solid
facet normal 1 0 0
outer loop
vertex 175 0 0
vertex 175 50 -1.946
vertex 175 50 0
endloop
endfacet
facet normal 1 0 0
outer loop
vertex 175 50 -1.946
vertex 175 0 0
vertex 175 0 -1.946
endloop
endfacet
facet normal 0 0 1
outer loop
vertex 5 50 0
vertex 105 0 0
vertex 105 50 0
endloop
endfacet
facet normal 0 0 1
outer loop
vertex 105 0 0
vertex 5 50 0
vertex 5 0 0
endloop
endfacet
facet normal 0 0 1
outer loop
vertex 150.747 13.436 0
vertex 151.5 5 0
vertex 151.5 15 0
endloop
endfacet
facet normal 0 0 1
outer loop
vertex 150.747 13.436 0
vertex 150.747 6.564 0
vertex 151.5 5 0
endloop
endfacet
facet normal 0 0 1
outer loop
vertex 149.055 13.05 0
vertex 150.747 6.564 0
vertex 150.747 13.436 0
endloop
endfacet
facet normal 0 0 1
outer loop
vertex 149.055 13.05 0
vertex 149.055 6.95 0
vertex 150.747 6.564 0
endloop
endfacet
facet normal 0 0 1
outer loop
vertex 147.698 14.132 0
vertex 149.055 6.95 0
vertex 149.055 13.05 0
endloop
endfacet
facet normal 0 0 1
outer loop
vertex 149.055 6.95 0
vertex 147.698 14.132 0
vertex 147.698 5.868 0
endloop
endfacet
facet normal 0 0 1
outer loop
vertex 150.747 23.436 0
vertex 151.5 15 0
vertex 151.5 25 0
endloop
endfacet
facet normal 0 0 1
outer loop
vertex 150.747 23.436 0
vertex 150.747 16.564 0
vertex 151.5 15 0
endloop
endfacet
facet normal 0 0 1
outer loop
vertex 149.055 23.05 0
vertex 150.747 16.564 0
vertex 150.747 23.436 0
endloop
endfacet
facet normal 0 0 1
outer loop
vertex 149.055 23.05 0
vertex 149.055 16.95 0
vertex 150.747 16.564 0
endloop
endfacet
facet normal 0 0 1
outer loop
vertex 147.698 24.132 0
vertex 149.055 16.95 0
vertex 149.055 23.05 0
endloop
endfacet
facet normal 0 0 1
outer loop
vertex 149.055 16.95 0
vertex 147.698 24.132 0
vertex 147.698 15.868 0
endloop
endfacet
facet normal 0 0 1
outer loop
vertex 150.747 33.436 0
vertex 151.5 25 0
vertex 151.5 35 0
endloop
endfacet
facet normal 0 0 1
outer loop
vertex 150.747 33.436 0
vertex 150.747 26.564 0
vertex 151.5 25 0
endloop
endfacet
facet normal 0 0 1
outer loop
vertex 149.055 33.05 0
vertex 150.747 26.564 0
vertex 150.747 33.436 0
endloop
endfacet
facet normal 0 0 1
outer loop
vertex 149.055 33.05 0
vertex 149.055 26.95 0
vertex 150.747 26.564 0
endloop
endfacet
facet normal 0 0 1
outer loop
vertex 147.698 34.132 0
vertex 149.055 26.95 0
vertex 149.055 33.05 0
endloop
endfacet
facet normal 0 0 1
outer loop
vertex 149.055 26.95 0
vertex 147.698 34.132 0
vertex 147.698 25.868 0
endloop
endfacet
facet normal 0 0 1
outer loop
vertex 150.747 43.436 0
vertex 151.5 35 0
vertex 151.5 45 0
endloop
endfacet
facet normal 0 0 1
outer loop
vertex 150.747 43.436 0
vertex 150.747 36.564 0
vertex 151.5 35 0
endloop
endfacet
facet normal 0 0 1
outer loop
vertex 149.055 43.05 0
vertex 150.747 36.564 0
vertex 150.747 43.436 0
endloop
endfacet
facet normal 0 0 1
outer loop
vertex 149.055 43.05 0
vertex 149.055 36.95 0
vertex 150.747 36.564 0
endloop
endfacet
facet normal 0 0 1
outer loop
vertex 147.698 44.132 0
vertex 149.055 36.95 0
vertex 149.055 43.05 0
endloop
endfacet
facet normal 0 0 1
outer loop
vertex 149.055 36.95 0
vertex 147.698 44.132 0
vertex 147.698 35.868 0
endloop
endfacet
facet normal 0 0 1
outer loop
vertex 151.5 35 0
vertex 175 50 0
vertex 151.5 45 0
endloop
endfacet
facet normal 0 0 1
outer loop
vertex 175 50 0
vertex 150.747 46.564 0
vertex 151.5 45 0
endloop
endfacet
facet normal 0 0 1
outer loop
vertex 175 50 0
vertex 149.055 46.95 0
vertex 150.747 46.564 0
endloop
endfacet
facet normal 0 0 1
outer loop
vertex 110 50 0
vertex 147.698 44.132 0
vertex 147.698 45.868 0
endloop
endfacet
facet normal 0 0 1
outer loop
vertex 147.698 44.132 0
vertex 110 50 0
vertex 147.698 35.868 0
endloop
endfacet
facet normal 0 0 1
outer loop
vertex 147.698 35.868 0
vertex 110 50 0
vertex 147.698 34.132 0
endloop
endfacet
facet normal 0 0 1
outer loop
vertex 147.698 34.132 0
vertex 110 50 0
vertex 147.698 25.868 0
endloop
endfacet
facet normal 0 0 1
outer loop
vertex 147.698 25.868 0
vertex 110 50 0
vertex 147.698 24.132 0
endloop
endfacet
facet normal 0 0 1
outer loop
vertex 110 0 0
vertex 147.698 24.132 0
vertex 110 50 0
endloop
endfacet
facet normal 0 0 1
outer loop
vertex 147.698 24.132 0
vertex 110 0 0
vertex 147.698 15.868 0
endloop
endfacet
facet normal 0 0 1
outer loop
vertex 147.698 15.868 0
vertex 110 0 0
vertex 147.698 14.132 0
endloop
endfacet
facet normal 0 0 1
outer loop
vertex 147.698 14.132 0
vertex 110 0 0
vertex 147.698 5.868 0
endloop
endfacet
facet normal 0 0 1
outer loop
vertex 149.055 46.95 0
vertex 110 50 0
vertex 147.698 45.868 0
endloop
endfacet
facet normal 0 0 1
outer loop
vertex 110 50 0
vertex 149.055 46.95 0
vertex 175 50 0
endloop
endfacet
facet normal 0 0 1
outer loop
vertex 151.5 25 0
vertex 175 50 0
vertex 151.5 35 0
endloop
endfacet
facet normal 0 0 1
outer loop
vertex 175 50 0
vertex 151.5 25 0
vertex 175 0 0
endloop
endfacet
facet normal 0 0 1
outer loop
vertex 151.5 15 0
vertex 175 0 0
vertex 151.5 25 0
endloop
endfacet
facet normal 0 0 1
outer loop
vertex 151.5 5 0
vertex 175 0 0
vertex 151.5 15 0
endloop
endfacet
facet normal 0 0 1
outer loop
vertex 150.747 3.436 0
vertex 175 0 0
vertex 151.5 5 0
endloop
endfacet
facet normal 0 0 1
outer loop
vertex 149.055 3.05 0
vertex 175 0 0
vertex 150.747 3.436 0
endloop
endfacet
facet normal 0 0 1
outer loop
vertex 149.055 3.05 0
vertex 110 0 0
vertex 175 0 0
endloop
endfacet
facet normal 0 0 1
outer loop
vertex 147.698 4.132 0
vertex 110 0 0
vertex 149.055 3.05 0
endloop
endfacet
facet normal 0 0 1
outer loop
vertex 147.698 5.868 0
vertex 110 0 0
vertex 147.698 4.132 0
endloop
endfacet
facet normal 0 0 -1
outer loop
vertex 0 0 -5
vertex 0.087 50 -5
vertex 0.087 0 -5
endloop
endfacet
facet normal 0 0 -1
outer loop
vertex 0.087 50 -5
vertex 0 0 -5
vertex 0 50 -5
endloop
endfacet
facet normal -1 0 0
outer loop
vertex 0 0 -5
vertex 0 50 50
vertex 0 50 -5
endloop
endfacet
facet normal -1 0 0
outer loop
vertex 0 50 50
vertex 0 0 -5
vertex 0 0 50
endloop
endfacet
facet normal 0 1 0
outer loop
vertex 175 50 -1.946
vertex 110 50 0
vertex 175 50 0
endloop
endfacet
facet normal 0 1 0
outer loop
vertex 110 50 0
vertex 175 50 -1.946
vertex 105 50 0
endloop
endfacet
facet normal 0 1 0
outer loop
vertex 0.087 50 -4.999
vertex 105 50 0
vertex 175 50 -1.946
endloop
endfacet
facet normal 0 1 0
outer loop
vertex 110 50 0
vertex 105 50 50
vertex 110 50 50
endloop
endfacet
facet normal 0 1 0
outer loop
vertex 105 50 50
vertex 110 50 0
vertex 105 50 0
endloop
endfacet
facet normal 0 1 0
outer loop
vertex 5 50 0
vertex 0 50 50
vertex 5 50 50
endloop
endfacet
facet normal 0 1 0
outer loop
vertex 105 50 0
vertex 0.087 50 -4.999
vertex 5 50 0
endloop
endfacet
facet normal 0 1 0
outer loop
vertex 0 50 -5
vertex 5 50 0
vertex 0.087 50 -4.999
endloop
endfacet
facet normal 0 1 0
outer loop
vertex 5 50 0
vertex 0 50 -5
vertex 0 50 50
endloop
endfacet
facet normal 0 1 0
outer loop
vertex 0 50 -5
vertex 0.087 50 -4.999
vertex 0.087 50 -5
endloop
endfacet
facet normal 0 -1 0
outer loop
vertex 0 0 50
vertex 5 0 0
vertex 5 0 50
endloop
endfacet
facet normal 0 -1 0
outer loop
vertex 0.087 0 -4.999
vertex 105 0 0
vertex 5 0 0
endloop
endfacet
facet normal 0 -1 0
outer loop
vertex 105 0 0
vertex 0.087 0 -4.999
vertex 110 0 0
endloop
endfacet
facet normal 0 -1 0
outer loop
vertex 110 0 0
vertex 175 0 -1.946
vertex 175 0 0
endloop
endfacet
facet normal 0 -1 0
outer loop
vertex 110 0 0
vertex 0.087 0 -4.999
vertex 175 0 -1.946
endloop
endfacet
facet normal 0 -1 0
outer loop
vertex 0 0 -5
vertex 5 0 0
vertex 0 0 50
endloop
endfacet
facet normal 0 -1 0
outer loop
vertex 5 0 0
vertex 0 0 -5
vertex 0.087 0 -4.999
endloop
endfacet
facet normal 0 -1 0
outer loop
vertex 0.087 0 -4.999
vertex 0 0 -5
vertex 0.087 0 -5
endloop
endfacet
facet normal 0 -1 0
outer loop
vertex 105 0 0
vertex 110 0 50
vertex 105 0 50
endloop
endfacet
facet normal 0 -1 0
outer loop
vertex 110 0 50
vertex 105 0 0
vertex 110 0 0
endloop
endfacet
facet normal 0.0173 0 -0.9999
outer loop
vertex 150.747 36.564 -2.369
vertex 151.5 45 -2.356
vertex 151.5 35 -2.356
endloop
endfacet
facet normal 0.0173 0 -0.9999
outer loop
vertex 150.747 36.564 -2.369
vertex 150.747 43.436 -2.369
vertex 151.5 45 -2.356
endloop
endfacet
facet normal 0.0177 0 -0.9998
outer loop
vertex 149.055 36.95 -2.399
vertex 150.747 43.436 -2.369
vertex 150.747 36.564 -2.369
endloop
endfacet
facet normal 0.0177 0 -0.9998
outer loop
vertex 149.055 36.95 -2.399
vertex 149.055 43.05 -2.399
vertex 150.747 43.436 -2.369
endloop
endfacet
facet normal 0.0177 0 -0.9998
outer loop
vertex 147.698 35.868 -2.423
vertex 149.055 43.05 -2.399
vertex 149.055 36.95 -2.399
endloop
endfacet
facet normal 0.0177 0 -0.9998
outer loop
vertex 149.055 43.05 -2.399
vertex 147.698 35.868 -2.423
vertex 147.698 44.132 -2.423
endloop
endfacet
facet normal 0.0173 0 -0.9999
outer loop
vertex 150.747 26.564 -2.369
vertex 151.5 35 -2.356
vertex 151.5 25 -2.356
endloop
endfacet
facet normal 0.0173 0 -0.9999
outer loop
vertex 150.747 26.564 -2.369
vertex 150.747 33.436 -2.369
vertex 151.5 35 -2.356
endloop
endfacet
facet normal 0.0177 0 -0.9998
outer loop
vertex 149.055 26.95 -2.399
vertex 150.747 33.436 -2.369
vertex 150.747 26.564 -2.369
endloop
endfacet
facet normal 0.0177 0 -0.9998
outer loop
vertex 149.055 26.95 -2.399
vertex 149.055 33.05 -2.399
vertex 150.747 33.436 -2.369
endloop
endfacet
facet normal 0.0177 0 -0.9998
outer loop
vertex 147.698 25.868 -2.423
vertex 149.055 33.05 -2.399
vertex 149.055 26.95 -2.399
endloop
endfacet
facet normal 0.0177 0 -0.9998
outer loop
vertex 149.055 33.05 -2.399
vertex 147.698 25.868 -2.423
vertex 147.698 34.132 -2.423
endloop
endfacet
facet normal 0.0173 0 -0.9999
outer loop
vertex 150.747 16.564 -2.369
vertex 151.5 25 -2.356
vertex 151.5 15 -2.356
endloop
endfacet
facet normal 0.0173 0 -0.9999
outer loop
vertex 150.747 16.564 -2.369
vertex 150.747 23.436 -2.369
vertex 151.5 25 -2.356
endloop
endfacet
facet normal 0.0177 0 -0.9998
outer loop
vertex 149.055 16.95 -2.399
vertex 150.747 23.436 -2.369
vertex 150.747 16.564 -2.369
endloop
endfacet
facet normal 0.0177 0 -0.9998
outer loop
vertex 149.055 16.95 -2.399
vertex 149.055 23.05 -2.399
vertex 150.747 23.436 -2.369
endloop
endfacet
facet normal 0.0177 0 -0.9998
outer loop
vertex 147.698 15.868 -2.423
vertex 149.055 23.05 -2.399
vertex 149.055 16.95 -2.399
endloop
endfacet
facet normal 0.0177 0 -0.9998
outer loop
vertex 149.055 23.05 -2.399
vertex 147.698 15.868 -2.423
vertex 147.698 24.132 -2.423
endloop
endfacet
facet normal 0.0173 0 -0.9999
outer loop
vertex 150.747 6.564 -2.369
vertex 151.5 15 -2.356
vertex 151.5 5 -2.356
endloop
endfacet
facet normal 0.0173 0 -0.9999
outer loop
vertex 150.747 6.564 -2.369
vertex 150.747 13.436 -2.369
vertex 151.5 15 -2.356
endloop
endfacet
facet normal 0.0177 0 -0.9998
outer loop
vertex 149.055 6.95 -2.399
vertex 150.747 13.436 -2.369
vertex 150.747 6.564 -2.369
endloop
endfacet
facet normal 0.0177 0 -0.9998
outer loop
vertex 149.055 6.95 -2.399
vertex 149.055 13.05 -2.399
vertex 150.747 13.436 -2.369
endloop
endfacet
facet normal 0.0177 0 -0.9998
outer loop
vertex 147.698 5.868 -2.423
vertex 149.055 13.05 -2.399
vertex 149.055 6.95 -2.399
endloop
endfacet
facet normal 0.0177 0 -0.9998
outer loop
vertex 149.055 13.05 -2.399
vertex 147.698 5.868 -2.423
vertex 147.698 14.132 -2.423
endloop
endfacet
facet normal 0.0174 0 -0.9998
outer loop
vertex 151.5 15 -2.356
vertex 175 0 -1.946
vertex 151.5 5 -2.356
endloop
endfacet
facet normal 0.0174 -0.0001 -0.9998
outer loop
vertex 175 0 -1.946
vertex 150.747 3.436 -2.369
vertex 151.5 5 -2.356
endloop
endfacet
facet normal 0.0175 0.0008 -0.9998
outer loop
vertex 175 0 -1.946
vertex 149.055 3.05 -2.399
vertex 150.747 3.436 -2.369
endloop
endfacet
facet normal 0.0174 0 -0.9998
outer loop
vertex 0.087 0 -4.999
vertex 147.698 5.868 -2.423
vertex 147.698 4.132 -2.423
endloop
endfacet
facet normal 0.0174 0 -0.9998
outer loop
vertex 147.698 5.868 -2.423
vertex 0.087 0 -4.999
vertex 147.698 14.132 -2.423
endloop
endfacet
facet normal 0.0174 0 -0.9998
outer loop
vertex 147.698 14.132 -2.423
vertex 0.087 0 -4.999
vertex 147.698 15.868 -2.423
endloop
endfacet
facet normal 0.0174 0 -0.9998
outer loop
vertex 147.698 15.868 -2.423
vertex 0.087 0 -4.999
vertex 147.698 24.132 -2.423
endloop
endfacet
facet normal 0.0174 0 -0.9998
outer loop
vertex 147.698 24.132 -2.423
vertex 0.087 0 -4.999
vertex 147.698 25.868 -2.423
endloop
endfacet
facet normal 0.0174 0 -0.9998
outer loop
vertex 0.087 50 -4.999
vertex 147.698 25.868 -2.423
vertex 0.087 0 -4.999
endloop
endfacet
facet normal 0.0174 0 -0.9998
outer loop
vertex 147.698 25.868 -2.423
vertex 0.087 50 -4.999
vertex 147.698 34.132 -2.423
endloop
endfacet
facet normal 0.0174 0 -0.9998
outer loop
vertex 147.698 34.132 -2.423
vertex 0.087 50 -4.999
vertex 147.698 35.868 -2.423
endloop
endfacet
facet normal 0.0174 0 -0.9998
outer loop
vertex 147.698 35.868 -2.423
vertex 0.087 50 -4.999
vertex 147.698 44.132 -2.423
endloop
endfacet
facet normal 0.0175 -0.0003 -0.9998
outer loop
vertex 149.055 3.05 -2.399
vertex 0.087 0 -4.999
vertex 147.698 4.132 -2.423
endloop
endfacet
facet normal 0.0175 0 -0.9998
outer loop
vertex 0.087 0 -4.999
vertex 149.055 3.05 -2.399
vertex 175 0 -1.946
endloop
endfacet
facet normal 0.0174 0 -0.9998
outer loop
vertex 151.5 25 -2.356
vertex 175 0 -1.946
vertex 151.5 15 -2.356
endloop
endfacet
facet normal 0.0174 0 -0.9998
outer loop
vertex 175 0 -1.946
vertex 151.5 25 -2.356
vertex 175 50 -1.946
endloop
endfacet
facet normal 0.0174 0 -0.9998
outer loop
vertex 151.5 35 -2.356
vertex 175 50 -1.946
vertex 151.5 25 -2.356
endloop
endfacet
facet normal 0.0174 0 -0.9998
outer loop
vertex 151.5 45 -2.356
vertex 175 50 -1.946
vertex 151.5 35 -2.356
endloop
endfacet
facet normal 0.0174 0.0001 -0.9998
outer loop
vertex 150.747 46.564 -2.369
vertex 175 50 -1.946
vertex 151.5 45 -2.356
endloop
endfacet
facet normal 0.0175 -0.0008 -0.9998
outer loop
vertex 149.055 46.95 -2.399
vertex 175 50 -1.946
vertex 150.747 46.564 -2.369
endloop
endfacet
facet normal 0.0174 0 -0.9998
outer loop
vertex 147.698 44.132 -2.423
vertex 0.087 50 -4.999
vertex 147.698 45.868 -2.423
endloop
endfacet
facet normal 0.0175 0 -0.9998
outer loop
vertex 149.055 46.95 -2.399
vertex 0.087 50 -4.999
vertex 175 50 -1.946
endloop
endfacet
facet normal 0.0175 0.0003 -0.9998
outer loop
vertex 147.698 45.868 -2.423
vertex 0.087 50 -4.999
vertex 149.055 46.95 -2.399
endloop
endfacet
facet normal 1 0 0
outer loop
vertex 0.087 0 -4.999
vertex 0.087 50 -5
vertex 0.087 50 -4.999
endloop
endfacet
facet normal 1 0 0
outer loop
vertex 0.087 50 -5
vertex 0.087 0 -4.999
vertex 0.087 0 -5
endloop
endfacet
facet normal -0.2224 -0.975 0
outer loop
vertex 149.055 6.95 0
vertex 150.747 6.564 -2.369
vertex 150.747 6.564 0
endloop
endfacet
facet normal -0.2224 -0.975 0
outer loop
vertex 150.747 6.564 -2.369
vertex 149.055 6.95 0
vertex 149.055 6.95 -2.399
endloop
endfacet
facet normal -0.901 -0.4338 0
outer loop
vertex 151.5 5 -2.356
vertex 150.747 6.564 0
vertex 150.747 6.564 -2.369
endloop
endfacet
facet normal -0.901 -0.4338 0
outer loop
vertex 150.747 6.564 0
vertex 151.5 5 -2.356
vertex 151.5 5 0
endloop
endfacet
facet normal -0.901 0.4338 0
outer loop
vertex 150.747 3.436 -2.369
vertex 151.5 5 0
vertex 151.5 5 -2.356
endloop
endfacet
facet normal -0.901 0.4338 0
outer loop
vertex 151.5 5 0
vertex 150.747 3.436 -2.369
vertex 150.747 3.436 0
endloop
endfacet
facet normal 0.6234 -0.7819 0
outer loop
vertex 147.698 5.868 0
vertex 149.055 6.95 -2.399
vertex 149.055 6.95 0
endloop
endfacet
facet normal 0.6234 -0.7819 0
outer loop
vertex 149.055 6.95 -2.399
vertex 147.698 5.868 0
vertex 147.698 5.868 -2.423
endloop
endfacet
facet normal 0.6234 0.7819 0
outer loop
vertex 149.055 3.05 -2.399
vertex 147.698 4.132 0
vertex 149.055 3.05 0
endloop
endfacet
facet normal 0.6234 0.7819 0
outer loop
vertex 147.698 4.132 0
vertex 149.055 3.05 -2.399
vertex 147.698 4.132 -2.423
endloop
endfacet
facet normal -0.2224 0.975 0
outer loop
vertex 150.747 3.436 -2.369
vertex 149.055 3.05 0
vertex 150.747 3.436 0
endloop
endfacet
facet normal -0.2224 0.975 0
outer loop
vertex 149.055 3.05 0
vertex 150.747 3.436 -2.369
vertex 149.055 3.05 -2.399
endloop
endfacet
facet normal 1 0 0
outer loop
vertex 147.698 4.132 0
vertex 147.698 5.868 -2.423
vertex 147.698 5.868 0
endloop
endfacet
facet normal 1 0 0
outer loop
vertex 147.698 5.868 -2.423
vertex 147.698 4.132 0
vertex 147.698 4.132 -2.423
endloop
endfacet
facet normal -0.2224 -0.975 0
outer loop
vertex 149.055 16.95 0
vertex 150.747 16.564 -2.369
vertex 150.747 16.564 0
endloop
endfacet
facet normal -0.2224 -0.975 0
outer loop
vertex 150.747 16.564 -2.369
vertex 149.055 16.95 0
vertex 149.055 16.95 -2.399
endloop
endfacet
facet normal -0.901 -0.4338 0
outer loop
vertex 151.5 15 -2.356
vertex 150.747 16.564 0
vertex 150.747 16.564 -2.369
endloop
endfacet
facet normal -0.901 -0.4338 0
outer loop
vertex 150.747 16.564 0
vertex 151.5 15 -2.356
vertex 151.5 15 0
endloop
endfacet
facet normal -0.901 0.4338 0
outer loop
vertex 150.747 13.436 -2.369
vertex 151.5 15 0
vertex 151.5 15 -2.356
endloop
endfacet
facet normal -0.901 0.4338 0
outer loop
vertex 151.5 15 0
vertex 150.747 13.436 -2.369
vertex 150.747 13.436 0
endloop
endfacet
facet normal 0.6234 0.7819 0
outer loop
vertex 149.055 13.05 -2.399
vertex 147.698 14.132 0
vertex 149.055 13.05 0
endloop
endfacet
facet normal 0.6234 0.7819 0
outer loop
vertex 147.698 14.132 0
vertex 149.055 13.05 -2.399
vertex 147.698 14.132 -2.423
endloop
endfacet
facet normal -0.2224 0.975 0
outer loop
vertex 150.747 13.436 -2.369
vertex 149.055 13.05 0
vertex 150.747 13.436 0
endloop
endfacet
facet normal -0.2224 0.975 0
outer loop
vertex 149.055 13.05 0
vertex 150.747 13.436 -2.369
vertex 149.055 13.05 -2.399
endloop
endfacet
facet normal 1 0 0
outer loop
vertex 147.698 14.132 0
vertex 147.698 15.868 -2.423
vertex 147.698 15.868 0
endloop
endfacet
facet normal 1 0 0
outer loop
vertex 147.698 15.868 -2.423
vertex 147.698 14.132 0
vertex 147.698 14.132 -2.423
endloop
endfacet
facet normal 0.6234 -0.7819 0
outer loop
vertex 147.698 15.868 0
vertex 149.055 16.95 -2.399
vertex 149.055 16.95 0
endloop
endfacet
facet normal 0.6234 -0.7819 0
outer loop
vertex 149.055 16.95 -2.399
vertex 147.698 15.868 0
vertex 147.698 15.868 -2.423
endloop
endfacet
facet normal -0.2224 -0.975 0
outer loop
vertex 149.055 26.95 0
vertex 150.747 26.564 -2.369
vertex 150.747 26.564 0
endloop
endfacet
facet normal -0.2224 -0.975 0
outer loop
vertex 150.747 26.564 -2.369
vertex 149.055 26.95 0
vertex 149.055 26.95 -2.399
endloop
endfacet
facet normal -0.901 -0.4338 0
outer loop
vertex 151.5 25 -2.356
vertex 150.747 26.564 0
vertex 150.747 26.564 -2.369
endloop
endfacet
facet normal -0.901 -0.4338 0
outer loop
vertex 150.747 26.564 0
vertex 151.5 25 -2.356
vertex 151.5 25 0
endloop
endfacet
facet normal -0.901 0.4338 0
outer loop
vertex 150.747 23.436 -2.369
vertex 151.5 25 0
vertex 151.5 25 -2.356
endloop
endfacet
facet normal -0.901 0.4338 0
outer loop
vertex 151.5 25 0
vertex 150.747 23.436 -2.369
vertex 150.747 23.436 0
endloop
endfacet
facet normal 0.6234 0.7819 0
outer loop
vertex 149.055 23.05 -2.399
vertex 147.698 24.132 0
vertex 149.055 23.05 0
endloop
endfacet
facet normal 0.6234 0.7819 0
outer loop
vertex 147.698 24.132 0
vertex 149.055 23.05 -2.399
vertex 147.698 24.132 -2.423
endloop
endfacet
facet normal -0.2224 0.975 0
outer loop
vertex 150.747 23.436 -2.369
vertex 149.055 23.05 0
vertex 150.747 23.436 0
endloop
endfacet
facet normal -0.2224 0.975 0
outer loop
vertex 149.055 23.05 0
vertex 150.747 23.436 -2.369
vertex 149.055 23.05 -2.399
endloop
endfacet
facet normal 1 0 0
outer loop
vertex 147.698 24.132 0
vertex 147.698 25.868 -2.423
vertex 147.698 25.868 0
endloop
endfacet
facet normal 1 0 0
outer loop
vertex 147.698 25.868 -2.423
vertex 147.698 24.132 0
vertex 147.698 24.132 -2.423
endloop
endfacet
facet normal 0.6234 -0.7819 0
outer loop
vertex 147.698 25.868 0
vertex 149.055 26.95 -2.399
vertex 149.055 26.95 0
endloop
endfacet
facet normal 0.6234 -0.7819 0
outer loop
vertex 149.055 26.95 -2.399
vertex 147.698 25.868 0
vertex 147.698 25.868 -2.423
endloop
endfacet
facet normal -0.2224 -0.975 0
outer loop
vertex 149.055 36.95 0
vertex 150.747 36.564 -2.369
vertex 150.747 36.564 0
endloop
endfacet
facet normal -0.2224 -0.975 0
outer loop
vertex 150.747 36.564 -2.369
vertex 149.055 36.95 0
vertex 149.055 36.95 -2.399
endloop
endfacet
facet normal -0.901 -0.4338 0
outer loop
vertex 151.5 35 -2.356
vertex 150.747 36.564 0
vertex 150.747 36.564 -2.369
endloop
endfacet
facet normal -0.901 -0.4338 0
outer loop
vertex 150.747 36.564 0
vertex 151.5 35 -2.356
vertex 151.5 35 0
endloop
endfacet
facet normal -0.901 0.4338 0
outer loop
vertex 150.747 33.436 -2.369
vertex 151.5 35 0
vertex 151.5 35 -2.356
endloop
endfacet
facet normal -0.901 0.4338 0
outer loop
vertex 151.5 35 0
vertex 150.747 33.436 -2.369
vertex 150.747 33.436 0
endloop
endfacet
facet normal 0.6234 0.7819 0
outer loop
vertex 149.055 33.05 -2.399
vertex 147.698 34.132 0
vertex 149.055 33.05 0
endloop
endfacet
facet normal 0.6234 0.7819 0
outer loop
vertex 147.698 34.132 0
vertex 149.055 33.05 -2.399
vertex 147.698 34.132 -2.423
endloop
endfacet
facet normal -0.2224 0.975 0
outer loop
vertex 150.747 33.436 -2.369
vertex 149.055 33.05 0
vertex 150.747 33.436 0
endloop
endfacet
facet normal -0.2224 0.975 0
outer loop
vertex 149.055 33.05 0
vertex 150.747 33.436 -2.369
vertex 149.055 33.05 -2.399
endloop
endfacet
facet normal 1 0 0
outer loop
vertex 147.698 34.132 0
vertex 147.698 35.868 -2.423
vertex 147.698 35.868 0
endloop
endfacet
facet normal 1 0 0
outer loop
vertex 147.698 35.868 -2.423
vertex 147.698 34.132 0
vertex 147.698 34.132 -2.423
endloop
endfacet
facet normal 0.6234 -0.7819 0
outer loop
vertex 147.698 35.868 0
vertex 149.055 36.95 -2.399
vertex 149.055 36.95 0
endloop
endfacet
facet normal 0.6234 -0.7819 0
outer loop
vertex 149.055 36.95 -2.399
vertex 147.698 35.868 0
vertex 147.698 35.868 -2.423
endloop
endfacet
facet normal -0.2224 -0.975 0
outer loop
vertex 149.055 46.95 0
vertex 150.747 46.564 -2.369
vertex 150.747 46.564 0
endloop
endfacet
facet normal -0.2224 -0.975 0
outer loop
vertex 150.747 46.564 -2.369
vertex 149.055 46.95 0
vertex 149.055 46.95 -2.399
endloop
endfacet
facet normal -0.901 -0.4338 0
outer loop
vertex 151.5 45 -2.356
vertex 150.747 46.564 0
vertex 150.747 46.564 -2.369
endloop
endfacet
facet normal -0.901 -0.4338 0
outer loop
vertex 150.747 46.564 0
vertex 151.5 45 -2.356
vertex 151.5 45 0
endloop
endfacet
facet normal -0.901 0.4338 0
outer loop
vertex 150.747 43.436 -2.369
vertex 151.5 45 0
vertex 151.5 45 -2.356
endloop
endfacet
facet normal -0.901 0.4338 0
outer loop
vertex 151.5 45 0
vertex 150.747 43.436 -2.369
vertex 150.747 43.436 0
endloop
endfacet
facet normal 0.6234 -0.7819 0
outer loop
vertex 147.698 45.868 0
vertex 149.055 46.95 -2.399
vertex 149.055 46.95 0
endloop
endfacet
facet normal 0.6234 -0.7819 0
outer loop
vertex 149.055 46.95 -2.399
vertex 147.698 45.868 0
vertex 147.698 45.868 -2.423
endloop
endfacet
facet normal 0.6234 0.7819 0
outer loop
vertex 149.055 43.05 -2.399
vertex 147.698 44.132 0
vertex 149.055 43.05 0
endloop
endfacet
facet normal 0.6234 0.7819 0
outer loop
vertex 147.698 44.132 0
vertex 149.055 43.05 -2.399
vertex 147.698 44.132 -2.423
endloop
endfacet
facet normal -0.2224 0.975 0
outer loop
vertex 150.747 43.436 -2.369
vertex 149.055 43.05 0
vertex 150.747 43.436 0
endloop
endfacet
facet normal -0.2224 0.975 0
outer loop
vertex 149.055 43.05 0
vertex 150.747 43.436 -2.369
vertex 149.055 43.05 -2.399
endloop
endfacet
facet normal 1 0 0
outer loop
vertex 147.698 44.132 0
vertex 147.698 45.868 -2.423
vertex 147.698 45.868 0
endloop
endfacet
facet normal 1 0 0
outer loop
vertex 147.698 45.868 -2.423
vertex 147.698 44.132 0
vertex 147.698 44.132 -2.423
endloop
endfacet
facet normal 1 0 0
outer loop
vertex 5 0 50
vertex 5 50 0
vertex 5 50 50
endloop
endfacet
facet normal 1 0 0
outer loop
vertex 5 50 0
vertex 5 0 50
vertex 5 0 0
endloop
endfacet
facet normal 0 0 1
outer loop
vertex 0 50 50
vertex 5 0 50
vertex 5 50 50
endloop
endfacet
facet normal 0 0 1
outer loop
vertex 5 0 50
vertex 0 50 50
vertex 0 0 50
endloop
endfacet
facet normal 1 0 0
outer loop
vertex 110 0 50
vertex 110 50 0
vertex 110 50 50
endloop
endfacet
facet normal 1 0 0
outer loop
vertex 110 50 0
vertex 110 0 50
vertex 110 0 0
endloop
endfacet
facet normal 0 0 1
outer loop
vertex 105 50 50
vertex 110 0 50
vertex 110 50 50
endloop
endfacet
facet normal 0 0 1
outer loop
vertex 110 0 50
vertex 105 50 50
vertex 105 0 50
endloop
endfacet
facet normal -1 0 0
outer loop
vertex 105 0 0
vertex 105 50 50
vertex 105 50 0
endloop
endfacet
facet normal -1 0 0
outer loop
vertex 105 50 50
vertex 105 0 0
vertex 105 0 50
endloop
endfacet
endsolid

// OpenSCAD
width = 100;
length = 50;
ledge = 75;
thickness = 5;
tall = 50;

cube([ thickness, length, tall ]);

translate([ width + thickness, 0, 0 ]) cube([ thickness, length, tall ]);

difference()
{
    difference()
    {
        translate([ 0, 0, -thickness ]) cube([ width + ledge, length, thickness ]);
        rotate([ 0, -1, 0 ]) translate([ 0, 0, 2 * -thickness ]) cube([ width + ledge, length, thickness ]);
    };
    translate([ width + (ledge * .66), 1 * (length / 10), -thickness ]) cylinder(h = thickness, r = 2);
    // translate([ width + (ledge * .66), 2 * (length / 10), -thickness ]) cylinder(h = thickness, r = 2);
    translate([ width + (ledge * .66), 3 * (length / 10), -thickness ]) cylinder(h = thickness, r = 2);
    // translate([ width + (ledge * .66), 4 * (length / 10), -thickness ]) cylinder(h = thickness, r = 2);
    translate([ width + (ledge * .66), 5 * (length / 10), -thickness ]) cylinder(h = thickness, r = 2);
    // translate([ width + (ledge * .66), 6 * (length / 10), -thickness ]) cylinder(h = thickness, r = 2);
    translate([ width + (ledge * .66), 7 * (length / 10), -thickness ]) cylinder(h = thickness, r = 2);
    // translate([ width + (ledge * .66), 8 * (length / 10), -thickness ]) cylinder(h = thickness, r = 2);
    translate([ width + (ledge * .66), 9 * (length / 10), -thickness ]) cylinder(h = thickness, r = 2);
}
